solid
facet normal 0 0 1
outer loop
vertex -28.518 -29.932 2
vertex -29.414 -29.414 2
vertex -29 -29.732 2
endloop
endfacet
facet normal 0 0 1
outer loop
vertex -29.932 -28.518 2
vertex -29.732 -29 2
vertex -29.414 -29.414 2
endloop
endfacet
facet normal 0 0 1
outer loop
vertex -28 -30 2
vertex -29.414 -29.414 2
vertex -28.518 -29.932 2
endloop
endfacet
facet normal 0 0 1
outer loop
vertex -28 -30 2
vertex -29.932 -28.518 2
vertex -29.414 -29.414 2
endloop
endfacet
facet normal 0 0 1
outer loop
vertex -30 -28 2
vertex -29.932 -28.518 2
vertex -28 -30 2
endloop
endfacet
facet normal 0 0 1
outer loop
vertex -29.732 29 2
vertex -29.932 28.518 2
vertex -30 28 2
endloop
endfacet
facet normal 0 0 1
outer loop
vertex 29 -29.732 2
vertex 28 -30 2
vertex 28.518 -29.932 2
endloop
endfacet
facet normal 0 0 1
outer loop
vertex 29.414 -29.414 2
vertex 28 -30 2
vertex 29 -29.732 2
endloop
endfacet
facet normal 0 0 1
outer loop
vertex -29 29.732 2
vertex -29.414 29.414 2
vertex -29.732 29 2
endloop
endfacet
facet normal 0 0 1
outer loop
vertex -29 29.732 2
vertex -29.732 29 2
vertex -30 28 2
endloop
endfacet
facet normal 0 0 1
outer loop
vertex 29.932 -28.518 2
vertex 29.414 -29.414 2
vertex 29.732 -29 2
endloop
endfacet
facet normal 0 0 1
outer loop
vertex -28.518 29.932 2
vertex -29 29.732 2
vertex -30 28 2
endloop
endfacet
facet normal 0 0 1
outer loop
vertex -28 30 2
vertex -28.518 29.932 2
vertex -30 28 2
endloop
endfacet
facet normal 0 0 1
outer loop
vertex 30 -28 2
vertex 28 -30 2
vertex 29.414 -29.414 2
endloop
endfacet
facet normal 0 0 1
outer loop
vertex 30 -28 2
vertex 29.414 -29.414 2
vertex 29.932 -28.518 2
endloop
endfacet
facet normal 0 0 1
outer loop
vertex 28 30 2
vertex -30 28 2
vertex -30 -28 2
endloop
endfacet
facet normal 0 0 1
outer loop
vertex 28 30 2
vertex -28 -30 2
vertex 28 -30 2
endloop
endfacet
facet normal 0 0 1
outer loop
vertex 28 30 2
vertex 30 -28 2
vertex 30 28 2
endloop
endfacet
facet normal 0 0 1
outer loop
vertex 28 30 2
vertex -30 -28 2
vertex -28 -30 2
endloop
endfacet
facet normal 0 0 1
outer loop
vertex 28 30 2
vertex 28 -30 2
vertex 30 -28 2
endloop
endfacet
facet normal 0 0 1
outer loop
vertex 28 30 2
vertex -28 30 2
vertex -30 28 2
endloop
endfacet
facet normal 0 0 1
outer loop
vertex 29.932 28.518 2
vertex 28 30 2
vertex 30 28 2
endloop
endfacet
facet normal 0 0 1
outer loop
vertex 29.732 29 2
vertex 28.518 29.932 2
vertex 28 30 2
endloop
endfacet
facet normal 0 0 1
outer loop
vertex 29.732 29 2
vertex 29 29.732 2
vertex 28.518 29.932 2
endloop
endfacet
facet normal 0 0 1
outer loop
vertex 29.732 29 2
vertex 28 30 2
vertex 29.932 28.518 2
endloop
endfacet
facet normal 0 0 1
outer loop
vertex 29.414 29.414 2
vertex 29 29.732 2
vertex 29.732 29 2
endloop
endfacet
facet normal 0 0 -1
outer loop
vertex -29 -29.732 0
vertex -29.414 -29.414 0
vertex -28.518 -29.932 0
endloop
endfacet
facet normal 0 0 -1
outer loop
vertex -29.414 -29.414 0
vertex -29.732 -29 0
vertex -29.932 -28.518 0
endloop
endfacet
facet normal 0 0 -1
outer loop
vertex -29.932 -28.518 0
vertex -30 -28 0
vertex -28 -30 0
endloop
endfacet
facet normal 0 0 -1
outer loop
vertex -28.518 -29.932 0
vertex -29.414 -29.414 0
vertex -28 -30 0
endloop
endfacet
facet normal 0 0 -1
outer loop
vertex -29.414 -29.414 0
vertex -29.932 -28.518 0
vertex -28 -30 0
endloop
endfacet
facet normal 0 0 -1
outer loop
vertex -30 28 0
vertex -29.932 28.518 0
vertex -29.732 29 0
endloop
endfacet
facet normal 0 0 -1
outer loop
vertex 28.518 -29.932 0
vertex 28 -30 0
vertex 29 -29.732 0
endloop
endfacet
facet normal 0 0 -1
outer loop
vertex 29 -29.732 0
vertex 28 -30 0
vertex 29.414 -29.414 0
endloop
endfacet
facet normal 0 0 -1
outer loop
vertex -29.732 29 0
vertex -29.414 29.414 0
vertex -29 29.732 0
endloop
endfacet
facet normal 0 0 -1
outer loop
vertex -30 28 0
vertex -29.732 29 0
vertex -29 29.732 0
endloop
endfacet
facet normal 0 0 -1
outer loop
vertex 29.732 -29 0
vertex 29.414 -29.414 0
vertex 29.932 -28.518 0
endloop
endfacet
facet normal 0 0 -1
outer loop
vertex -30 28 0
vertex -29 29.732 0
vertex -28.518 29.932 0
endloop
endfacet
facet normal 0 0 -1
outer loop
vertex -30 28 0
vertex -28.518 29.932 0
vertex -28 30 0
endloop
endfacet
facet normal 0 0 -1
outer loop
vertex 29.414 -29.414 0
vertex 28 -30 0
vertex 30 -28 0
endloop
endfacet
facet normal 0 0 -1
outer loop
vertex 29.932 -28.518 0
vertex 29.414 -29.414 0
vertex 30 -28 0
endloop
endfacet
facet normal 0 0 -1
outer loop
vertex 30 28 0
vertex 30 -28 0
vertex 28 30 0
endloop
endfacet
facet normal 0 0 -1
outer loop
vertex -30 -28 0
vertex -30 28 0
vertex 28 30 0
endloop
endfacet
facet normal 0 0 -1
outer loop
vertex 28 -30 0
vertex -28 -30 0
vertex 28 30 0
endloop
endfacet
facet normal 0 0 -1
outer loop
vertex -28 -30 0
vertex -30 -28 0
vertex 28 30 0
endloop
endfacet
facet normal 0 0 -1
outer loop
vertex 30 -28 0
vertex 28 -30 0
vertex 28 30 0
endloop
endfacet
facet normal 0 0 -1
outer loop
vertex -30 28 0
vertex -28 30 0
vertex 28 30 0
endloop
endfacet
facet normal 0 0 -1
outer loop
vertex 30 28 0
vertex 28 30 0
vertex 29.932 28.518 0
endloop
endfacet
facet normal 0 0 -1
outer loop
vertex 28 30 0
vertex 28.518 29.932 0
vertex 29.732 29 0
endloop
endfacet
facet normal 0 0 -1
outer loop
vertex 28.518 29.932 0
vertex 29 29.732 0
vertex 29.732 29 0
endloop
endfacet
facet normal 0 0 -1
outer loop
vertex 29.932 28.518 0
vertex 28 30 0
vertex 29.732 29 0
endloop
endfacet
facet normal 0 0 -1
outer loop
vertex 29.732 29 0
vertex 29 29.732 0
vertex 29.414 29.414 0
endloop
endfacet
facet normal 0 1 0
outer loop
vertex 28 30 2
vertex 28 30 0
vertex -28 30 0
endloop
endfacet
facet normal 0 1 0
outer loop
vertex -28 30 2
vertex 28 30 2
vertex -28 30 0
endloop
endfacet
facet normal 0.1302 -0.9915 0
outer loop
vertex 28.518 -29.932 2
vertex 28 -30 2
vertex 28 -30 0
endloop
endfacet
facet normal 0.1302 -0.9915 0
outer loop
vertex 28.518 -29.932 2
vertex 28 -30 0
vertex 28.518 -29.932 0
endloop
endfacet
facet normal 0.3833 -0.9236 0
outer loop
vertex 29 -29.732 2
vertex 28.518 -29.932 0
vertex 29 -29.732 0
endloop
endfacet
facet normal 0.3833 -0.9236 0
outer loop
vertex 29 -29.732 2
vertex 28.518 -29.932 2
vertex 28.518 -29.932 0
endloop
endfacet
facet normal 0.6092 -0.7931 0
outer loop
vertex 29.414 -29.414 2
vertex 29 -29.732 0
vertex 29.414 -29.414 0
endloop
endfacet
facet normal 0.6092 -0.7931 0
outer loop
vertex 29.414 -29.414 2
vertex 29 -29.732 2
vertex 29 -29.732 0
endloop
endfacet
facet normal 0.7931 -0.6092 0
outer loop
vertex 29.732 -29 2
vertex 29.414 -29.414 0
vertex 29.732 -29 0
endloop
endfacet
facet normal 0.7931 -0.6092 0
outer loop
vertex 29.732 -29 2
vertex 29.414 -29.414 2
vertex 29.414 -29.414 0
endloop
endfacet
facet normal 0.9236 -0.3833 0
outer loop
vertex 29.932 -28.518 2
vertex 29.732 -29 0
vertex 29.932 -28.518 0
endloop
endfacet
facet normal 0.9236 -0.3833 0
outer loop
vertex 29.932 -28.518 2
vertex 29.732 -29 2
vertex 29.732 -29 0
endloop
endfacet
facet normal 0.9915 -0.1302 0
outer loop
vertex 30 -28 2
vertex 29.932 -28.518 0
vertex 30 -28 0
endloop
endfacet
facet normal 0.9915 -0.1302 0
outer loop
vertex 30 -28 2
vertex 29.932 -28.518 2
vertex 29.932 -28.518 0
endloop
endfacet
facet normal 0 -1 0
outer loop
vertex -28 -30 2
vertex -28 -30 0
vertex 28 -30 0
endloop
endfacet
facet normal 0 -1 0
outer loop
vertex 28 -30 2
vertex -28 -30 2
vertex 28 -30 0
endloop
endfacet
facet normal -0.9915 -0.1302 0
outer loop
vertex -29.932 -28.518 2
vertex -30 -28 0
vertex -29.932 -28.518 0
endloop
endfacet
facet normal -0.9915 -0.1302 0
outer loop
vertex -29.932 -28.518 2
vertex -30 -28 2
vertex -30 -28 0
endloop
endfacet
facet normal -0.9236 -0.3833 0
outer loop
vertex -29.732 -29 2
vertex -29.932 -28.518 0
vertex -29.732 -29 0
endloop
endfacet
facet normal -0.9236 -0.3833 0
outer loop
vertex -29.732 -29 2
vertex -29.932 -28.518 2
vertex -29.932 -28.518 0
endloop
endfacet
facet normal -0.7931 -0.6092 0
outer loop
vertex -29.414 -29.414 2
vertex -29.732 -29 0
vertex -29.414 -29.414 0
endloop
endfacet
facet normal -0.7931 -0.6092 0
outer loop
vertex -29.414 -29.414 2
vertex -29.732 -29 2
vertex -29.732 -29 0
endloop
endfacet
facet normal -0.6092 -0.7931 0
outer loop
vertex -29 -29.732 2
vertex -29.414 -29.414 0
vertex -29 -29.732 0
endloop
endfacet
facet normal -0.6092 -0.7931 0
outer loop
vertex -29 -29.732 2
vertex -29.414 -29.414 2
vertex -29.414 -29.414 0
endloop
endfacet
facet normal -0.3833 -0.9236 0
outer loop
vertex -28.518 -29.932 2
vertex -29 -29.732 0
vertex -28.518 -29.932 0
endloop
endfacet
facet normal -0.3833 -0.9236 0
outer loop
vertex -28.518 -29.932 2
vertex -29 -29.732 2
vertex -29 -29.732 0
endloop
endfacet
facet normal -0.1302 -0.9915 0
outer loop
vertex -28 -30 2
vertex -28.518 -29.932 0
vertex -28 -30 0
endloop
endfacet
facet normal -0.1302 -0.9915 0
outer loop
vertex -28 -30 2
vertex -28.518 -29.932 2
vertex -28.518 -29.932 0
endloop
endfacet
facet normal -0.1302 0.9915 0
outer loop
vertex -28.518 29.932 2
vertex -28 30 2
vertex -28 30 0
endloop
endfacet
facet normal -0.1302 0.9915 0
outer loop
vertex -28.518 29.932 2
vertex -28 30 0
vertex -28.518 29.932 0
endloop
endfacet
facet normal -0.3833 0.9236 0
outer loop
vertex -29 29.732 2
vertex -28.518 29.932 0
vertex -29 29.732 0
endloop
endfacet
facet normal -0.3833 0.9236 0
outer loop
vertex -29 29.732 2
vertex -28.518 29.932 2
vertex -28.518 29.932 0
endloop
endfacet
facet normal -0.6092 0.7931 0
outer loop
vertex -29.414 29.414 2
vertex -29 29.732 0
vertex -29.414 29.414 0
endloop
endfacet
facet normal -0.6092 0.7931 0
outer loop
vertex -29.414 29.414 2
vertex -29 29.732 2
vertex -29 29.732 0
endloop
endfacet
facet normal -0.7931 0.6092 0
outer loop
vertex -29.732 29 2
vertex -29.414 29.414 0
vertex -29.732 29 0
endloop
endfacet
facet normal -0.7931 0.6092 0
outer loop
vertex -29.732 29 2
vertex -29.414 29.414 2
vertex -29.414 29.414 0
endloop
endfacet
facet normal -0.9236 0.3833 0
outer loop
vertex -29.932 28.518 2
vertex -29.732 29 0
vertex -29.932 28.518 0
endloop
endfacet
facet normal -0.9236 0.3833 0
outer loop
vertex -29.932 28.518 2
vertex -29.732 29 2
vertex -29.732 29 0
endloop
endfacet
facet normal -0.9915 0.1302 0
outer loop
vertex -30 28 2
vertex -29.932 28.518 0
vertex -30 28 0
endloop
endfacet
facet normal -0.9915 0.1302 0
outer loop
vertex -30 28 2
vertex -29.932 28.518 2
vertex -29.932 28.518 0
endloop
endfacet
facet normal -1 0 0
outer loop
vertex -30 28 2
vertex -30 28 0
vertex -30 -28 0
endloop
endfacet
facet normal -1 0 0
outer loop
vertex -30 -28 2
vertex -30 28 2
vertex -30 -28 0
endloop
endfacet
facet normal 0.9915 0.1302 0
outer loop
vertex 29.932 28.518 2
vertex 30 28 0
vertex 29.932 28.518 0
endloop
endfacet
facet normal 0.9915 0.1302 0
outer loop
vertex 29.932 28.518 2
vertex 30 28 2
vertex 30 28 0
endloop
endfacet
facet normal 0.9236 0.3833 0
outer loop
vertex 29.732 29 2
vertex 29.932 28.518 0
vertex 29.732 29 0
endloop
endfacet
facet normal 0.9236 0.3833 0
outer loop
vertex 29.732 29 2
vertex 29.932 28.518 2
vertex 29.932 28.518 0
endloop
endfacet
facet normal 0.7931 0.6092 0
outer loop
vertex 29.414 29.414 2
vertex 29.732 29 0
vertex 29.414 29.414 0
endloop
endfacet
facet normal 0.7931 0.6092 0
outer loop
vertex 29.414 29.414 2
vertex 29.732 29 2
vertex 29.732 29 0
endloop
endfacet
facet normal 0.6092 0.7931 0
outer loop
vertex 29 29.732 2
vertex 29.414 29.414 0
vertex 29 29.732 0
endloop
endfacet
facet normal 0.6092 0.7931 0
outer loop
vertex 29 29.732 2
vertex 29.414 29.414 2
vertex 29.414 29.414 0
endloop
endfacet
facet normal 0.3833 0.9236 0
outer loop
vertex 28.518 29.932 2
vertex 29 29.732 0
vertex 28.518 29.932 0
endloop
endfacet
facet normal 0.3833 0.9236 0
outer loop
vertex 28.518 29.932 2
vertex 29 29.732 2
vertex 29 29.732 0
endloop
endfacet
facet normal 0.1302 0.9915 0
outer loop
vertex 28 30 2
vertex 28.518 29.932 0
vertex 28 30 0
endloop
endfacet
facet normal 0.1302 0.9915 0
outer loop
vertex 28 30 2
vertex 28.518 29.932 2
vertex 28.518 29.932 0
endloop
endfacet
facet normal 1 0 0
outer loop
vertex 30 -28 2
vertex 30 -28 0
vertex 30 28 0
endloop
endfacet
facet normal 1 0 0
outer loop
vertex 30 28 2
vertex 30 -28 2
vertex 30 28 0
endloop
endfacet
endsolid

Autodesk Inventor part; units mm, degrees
ref_plane "YZ Plane" through (0, 0, 0) normal (1, 0, 0) x (0, 1, 0)
ref_plane "XZ Plane" through (0, 0, 0) normal (0, 1, 0) x (-1, 0, 0)
ref_plane "XY Plane" through (0, 0, 0) normal (0, 0, 1) x (1, 0, 0)
sketch "Sketch1" plane through (0, 0, 0) normal (0, 0, 1) x (1, 0, 0)
  line L0 (-30, -30) -> (30, -30)
  line L1 (30, -30) -> (30, 30)
  line L2 (30, 30) -> (-30, 30)
  line L3 (-30, 30) -> (-30, -30)
  line L4 (-30, -30) -> (30, 30) construction
  line L5 (30, -30) -> (-30, 30) construction
  line L6 (15.25, -15.25) -> (-15.25, -15.25)
  line L7 (-15.25, -15.25) -> (-15.25, 15.25)
  line L8 (-15.25, 15.25) -> (15.25, 15.25)
  line L9 (15.25, 15.25) -> (15.25, -15.25)
  line L10 (15.25, -15.25) -> (-15.25, 15.25) construction
  line L11 (-15.25, -15.25) -> (15.25, 15.25) construction
  point P0 (0, 0)
  dimension "d154" = 60
  dimension "d155" = 60
  dimension "d172" = 30.5
extrude "Plate5" add sketch "Sketch1" along normal blind 2 contours L3 L2 L1 L0 | L6 L7 L8 L9
fillet "Corner Round1" radius 2 4 edges at (30, 30, 1) (-30, 30, 1) (-30, -30, 1) (30, -30, 1)
properties part number "TZS 767 FDS 940 CUP 2" material "Stainless Steel"
